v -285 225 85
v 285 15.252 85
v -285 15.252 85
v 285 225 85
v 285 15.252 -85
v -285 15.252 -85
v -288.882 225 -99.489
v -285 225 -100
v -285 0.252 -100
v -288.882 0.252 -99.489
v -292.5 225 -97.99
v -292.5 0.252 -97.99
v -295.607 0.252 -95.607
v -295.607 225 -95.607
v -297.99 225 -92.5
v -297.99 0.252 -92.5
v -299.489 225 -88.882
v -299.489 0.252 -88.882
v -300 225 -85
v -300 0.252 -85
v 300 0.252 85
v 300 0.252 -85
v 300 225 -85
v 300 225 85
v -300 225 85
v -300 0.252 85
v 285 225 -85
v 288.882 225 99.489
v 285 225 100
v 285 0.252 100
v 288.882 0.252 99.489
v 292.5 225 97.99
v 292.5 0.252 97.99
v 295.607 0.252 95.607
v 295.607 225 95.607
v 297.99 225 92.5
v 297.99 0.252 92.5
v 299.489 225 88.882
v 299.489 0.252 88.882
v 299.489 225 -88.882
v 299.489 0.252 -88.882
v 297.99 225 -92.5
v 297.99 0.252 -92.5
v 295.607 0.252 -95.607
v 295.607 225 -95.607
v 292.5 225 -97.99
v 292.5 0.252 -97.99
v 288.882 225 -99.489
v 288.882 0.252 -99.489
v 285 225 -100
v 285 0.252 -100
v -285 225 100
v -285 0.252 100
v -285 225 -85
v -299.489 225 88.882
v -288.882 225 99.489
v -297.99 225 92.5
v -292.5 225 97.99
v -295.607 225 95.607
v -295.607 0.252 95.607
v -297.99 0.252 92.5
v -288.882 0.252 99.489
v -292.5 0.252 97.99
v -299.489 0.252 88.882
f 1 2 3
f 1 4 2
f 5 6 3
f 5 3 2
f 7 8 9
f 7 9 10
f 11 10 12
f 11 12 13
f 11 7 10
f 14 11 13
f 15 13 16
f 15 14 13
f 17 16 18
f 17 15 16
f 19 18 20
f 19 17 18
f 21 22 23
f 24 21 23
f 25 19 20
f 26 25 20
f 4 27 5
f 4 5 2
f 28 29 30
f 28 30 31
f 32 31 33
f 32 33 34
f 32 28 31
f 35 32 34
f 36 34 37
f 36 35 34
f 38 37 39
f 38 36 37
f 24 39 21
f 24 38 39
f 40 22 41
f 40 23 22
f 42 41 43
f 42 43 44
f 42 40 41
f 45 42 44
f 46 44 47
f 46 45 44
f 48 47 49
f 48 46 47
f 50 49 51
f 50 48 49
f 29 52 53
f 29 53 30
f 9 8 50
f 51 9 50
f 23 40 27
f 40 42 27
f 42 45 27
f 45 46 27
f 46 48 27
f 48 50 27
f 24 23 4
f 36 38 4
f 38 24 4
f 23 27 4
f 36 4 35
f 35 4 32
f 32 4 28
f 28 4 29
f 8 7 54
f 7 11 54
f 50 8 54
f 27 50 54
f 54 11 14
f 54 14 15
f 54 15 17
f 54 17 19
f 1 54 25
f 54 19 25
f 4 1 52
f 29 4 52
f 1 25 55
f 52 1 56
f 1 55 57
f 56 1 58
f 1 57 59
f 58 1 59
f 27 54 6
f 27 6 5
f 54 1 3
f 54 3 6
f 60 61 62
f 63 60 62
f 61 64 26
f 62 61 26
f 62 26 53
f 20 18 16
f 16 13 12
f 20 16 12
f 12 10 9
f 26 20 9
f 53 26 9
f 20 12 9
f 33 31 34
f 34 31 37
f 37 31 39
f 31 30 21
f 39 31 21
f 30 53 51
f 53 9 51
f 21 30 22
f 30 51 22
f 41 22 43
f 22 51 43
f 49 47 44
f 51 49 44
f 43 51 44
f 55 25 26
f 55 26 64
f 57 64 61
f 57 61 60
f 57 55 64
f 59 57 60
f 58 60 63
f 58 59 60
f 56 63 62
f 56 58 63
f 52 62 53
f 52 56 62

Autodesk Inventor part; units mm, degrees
ref_plane "YZ Plane" through (0, 0, 0) normal (1, 0, 0) x (0, 1, 0)
ref_plane "XZ Plane" through (0, 0, 0) normal (0, 1, 0) x (-1, 0, 0)
ref_plane "XY Plane" through (0, 0, 0) normal (0, 0, 1) x (1, 0, 0)
sketch "Skizze1" plane through (0, 0, 0) normal (0, 0, 1) x (1, 0, 0)
  line L0 (-300, 0.252) -> (300, 0.252)
  line L1 (300, 0.252) -> (300, 250.252)
  line L2 (300, 250.252) -> (-300, 250.252)
  line L3 (-300, 250.252) -> (-300, 0.252)
  point P0 (0, 0)
  dimension "d0" = 600
  dimension "d1" = 250
extrude "Extrusion1" add sketch "Skizze1" along normal mid plane 200
sketch "Skizze2" plane through (-300, 250.252, 100) normal (0, 1, 0) x (1, 0, 0)
  line L0 (600, 0) -> (0, 0) projected
  line L1 (600, 200) -> (600, 0) projected
  line L2 (15, 0) -> (585, 0)
  line L3 (600, 15) -> (600, 185)
  line L4 (585, 200) -> (15, 200)
  line L5 (0, 185) -> (0, 15)
  arc A0 (0, 15) -> (15, 0) centre (15, 15) ccw
  arc A1 (15, 200) -> (0, 185) centre (15, 185) ccw
  arc A2 (600, 185) -> (585, 200) centre (585, 185) ccw
  arc A3 (585, 0) -> (600, 15) centre (585, 15) ccw
  line L6 (0, 200) -> (0, 0) projected
  line L7 (0, 200) -> (600, 200) projected
  line L8 (0, 0) -> (600, 0)
  line L9 (600, 0) -> (600, 200)
  line L10 (600, 200) -> (0, 200)
  line L11 (0, 200) -> (0, 0)
  point P0 (300, 100)
  point P1 (585, 0)
  dimension "d4" = 15
extrude "Extrusion2" cut sketch "Skizze2" against normal through all contours L0 A3 L1 | L0 L6 A0 | A2 L7 L1 | L6 L7 A1
sketch "Skizze3" plane through (-285, 250.252, 100) normal (0, 1, 0) x (1, 0, 0)
  arc A0 (0, 200) -> (-15, 185) centre (0, 185) ccw projected
  arc A1 (570, 0) -> (585, 15) centre (570, 15) ccw projected
  line L0 (0, 185) -> (570, 185)
  line L1 (570, 185) -> (570, 15)
  line L2 (570, 15) -> (0, 15)
  line L3 (0, 15) -> (0, 185)
  point P0 (285, 100)
extrude "Extrusion3" cut sketch "Skizze3" against normal blind 235
sketch "Skizze4" plane through (0, 0, 0) normal (1, 0, 0) x (0, 1, 0)
  line L0 (225, 85) -> (225, -110.1417)
  line L1 (250.252, -85) -> (15.252, -85) projected
  line L2 (225, 85) -> (225, 112.4289)
  line L3 (225, 112.4289) -> (265.8438, 112.4289)
  line L4 (265.8438, 112.4289) -> (265.8438, -110.1417)
  line L5 (265.8438, -110.1417) -> (225, -110.1417)
  point P0 (0, 0)
extrude "Extrusion4" cut sketch "Skizze4" along normal through all both and the other way through all
properties part number "beetkasten"
